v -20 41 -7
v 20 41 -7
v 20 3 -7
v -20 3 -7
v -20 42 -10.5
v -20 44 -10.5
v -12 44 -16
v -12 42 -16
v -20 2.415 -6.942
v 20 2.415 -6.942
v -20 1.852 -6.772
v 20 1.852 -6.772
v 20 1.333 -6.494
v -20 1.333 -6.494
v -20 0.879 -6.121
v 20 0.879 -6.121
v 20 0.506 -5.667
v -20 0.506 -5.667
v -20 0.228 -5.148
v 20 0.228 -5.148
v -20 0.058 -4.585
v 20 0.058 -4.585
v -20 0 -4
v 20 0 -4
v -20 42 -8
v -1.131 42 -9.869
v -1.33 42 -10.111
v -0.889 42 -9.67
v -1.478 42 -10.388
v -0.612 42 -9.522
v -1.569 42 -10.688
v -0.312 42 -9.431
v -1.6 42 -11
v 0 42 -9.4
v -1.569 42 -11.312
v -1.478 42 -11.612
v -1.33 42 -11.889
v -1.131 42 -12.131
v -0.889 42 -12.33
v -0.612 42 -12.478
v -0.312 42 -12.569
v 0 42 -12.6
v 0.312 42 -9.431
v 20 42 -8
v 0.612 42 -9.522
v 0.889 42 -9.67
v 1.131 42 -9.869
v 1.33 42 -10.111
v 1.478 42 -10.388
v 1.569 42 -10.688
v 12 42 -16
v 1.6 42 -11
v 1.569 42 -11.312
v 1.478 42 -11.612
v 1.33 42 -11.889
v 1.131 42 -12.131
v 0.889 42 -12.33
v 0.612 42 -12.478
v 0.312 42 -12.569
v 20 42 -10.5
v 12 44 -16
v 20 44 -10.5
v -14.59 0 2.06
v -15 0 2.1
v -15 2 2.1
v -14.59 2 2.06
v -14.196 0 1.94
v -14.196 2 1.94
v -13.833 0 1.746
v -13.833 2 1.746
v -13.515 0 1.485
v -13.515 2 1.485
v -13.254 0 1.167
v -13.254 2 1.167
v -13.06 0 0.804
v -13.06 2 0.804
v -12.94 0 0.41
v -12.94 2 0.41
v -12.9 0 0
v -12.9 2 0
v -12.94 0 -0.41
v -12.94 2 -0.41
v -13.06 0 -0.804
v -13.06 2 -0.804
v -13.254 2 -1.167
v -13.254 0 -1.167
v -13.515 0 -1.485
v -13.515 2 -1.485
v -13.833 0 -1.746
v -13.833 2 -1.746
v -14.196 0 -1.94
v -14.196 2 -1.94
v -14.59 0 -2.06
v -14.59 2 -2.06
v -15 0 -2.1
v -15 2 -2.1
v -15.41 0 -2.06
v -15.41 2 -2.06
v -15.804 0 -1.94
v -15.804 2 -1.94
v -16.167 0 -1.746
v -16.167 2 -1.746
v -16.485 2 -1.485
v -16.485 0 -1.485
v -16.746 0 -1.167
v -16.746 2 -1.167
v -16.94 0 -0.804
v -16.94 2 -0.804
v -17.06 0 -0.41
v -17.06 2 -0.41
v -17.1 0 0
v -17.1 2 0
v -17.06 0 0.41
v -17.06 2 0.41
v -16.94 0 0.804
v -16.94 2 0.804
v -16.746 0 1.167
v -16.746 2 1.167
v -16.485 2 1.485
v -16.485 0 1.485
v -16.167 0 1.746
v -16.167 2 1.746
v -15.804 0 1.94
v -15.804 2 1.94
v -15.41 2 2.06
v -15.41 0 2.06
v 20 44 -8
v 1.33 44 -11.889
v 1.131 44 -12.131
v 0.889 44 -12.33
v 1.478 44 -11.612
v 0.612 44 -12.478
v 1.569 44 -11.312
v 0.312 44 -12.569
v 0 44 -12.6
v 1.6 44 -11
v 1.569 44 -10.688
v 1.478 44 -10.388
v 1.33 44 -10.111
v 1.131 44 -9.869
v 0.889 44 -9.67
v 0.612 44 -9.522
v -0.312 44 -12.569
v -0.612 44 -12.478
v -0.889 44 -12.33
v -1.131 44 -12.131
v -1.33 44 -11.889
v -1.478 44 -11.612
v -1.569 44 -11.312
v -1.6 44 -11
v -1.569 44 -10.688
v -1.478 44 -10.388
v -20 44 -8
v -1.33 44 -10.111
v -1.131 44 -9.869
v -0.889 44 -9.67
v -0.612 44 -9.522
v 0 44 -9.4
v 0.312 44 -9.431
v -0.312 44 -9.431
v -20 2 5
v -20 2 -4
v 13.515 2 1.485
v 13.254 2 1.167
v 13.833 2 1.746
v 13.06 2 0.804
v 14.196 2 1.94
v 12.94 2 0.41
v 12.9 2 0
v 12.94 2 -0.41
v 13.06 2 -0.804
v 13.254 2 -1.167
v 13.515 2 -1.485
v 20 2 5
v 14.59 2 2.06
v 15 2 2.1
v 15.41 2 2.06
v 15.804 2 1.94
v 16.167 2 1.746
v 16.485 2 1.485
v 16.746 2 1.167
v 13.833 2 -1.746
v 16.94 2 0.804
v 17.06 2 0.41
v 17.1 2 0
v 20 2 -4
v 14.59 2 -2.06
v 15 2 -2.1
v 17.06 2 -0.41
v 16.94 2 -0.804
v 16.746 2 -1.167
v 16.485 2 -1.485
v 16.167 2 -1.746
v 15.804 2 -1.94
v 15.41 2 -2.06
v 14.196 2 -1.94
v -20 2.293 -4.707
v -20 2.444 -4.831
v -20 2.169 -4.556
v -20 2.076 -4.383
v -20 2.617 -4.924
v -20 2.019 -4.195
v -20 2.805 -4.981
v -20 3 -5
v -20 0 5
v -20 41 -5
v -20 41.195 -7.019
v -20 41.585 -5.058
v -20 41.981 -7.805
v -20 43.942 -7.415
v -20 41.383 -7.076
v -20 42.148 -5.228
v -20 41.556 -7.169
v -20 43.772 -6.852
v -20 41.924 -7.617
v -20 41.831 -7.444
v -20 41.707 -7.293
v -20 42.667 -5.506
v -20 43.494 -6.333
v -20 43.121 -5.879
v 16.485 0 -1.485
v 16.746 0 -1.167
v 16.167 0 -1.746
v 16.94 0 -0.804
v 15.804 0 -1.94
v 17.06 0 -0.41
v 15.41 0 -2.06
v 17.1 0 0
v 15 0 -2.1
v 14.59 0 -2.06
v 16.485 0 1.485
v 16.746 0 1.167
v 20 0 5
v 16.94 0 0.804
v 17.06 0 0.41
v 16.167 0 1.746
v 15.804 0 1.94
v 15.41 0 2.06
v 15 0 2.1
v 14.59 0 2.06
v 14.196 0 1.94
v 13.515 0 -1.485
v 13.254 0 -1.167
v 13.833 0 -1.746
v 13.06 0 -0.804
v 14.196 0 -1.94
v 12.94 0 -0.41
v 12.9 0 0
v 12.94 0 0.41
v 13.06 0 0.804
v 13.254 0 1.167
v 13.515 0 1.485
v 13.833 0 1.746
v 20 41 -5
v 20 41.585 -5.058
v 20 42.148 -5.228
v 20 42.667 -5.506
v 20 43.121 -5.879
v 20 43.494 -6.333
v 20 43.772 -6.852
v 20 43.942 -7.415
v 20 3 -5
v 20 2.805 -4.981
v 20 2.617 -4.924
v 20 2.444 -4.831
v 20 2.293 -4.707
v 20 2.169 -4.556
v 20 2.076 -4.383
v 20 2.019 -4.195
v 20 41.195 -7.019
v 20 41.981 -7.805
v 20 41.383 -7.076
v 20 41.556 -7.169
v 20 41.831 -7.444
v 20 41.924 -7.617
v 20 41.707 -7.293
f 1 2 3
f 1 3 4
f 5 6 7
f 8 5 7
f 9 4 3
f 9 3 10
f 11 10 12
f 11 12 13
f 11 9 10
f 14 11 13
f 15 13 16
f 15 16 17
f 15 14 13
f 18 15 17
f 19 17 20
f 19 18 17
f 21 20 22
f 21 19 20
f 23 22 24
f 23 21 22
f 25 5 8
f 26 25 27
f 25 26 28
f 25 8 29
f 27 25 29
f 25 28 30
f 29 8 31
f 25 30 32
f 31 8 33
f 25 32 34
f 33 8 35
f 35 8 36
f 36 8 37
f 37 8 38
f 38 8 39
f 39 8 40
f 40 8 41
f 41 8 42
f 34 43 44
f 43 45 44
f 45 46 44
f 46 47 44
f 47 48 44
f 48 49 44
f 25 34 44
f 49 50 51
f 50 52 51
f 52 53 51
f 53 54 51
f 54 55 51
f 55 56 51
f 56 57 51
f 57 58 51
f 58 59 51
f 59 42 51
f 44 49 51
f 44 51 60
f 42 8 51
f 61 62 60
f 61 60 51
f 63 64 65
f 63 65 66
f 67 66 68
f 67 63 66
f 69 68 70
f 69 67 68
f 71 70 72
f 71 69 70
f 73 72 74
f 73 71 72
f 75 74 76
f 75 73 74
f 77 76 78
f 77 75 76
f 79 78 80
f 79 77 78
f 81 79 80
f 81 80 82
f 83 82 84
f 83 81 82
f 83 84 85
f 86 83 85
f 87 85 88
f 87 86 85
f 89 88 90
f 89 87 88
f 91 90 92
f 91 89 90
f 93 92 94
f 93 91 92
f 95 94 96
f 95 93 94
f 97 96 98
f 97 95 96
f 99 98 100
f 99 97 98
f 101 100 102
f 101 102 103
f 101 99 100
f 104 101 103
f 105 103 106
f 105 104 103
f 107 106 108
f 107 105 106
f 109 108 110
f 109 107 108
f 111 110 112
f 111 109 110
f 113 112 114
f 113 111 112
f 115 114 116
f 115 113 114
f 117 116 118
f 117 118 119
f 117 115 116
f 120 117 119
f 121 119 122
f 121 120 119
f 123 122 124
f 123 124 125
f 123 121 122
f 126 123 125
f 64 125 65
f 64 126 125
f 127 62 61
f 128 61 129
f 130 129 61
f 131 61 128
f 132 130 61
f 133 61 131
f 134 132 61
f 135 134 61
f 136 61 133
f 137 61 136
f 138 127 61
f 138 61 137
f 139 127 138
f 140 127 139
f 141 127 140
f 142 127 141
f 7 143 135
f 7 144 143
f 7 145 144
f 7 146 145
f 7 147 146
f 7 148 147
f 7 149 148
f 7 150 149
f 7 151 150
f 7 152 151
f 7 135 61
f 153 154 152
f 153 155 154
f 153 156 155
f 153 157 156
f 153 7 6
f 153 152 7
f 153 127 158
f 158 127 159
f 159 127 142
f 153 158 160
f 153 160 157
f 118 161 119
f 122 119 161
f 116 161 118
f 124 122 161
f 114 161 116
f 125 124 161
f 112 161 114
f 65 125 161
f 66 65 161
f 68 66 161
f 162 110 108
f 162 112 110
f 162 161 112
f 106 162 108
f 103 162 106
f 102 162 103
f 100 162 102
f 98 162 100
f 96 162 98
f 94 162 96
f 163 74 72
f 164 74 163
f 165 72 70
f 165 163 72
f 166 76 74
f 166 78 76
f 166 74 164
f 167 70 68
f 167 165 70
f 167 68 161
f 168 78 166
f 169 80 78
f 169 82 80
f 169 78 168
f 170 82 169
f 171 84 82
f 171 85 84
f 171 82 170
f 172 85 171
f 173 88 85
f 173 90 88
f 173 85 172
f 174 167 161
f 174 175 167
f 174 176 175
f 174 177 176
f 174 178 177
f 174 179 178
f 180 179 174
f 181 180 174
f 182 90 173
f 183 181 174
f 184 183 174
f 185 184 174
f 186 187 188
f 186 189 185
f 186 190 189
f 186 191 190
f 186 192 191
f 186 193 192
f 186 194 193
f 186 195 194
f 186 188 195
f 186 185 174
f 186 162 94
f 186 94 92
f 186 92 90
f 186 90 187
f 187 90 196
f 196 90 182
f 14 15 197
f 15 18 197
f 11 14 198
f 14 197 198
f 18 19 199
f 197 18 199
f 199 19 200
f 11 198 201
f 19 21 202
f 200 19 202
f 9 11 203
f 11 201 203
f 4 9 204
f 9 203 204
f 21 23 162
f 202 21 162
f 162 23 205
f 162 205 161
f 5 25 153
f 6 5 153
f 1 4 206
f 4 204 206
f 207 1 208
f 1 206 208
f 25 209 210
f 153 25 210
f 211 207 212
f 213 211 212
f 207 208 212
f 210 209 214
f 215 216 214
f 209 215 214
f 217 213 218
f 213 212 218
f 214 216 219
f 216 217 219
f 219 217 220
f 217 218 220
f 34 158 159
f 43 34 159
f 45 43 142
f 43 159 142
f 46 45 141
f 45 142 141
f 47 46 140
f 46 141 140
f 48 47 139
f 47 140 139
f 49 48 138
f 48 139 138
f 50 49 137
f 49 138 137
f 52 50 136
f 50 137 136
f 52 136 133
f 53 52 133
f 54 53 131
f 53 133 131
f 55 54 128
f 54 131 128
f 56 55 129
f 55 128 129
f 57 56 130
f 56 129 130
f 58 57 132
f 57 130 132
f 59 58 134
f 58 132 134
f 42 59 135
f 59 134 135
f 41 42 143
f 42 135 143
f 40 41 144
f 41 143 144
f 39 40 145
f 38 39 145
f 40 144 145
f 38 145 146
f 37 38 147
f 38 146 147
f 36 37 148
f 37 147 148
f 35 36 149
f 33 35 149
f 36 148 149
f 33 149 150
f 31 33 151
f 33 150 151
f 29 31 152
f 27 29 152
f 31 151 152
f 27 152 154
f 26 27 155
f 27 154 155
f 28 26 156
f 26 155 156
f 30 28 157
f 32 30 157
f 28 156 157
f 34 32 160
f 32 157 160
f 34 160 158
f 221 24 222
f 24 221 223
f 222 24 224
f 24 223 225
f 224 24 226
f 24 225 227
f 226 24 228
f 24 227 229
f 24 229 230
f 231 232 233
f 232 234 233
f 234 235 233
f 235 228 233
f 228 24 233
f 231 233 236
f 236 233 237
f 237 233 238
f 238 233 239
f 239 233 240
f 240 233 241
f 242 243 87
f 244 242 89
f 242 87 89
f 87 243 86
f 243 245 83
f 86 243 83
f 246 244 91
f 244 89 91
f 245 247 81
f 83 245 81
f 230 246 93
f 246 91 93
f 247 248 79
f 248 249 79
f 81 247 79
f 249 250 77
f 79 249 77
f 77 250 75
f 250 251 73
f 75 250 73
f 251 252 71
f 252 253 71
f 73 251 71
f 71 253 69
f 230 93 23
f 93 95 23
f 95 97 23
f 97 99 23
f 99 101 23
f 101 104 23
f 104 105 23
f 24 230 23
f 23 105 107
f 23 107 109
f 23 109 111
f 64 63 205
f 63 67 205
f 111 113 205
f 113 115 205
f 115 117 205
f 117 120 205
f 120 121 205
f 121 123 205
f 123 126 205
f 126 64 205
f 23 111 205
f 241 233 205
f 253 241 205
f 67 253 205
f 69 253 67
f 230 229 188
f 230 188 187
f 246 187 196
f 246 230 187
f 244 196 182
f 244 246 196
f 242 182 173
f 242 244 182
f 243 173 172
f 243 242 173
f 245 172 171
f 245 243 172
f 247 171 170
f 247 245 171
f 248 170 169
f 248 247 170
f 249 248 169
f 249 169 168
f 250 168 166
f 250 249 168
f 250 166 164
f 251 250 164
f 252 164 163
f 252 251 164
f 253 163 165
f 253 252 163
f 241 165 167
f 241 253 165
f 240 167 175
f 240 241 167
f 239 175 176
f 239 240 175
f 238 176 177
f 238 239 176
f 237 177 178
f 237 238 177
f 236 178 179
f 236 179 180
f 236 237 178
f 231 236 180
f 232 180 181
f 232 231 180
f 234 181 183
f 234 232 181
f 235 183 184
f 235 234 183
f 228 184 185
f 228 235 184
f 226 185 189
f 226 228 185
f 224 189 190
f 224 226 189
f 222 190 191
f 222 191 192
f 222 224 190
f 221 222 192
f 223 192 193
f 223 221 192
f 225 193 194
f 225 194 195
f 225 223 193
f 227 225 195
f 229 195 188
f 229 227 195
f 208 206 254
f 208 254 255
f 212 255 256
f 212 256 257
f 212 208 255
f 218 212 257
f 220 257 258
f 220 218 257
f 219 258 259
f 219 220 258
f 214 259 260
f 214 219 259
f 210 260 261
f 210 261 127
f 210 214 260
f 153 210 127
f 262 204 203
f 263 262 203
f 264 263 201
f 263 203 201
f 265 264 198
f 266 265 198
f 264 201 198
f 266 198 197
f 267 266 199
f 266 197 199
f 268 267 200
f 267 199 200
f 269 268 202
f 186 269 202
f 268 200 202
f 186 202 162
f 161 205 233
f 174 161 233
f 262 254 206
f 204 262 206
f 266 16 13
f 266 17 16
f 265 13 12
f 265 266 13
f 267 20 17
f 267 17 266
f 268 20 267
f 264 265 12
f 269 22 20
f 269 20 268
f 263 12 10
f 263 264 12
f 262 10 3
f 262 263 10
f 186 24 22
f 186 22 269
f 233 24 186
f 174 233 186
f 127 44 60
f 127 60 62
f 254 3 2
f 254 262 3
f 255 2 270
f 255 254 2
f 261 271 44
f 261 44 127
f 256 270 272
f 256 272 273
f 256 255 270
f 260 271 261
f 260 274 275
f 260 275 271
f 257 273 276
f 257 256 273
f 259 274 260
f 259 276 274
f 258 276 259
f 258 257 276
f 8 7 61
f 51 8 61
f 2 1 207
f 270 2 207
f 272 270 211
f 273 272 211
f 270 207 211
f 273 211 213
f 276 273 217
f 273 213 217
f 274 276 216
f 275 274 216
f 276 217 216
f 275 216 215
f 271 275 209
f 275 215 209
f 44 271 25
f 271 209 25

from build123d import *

# Parameters (mm, degrees)
SKETCH_2_W            = 40
SKETCH_2_H            = 10
SKETCH_2_R            = 2.1
EXTRUDE_1_DEPTH       = 2
SKETCH_3_W            = 40
SKETCH_3_H            = 44
EXTRUDE_2_DEPTH       = 2
SKETCH_4_W            = 40
SKETCH_4_H            = 11
SKETCH_4_R            = 1.6
EXTRUDE_3_DEPTH       = 2
CUT_EXTRUDE_1_DEPTH   = 51.911688245
SHEET_START           = -20
SHEET_METAL_1_DEPTH   = 40
SHEET_METAL_1_2_DEPTH = 40


# Read off the part's stored shape, not the designer's step: 转换实体1
with BuildPart() as part:
    # Sketch 2 → 凸台-拉伸1 (new body)
    with BuildSketch(Plane(origin=(0, 0, 0), x_dir=(1, 0, 0), z_dir=(0, 1, 0))):
        Rectangle(SKETCH_2_W, SKETCH_2_H)
        with Locations(Location((-15, 0, 0), (0, 0, 270))):
            Circle(SKETCH_2_R, mode=Mode.SUBTRACT)
        with Locations(Location((15, 0, 0), (0, 0, 90))):
            Circle(SKETCH_2_R, mode=Mode.SUBTRACT)
    extrude(amount=EXTRUDE_1_DEPTH)

    # 草图3 → 凸台-拉伸2 (add)
    with BuildSketch(Plane(origin=(0, 0, -5), x_dir=(-1, 0, 0), z_dir=(0, 0, -1))):
        with Locations((0, 22)):
            Rectangle(SKETCH_3_W, SKETCH_3_H)
    extrude(amount=EXTRUDE_2_DEPTH)

    # 草图4 → 凸台-拉伸3 (add)
    with BuildSketch(Plane(origin=(0, 44, 0), x_dir=(1, 0, 0), z_dir=(0, 1, 0))):
        with Locations((0, 10.5)):
            Rectangle(SKETCH_4_W, SKETCH_4_H)
        with Locations(Location((0, 11, 0), (0, 0, 270))):
            Circle(SKETCH_4_R, mode=Mode.SUBTRACT)
    extrude(amount=-EXTRUDE_3_DEPTH)

    # 草图5 → 切除-拉伸1 (cut, through all)
    with BuildSketch(Plane(origin=(0, 44, 0), x_dir=(1, 0, 0), z_dir=(0, 1, 0))):
        Polygon((-20, 16), (-20, 10.5), (-12, 16), align=None)
        Polygon((20, 10.5), (12, 16), (20, 16), align=None)
    extrude(amount=-CUT_EXTRUDE_1_DEPTH, mode=Mode.SUBTRACT)

    # Sheet Metal 1 outline → Sheet Metal 1 (cut)
    with BuildSketch(Plane.YZ.offset(SHEET_START)):
        with BuildLine():
            Line((44, -5), (41, -5))
            ThreePointArc((41, -5), (43.121320344, -5.878679656), (44, -8))
            Line((44, -8), (44, -5))
        make_face()
        with BuildLine():
            ThreePointArc((3, -7), (0.878679656, -6.121320344), (0, -4))
            Line((0, -4), (0, -7))
            Line((0, -7), (3, -7))
        make_face()
    extrude(amount=SHEET_METAL_1_DEPTH, mode=Mode.SUBTRACT)

    # Sheet Metal 1 2 outline → Sheet Metal 1 2 (add)
    with BuildSketch(Plane.YZ.offset(SHEET_START)):
        with BuildLine():
            ThreePointArc((3, -5), (2.292893219, -4.707106781), (2, -4))
            Line((2, -4), (2, -5))
            Line((2, -5), (3, -5))
        make_face()
        with BuildLine():
            Line((42, -7), (41, -7))
            ThreePointArc((41, -7), (41.707106781, -7.292893219), (42, -8))
            Line((42, -8), (42, -7))
        make_face()
    extrude(amount=SHEET_METAL_1_2_DEPTH)


solid = part.part
